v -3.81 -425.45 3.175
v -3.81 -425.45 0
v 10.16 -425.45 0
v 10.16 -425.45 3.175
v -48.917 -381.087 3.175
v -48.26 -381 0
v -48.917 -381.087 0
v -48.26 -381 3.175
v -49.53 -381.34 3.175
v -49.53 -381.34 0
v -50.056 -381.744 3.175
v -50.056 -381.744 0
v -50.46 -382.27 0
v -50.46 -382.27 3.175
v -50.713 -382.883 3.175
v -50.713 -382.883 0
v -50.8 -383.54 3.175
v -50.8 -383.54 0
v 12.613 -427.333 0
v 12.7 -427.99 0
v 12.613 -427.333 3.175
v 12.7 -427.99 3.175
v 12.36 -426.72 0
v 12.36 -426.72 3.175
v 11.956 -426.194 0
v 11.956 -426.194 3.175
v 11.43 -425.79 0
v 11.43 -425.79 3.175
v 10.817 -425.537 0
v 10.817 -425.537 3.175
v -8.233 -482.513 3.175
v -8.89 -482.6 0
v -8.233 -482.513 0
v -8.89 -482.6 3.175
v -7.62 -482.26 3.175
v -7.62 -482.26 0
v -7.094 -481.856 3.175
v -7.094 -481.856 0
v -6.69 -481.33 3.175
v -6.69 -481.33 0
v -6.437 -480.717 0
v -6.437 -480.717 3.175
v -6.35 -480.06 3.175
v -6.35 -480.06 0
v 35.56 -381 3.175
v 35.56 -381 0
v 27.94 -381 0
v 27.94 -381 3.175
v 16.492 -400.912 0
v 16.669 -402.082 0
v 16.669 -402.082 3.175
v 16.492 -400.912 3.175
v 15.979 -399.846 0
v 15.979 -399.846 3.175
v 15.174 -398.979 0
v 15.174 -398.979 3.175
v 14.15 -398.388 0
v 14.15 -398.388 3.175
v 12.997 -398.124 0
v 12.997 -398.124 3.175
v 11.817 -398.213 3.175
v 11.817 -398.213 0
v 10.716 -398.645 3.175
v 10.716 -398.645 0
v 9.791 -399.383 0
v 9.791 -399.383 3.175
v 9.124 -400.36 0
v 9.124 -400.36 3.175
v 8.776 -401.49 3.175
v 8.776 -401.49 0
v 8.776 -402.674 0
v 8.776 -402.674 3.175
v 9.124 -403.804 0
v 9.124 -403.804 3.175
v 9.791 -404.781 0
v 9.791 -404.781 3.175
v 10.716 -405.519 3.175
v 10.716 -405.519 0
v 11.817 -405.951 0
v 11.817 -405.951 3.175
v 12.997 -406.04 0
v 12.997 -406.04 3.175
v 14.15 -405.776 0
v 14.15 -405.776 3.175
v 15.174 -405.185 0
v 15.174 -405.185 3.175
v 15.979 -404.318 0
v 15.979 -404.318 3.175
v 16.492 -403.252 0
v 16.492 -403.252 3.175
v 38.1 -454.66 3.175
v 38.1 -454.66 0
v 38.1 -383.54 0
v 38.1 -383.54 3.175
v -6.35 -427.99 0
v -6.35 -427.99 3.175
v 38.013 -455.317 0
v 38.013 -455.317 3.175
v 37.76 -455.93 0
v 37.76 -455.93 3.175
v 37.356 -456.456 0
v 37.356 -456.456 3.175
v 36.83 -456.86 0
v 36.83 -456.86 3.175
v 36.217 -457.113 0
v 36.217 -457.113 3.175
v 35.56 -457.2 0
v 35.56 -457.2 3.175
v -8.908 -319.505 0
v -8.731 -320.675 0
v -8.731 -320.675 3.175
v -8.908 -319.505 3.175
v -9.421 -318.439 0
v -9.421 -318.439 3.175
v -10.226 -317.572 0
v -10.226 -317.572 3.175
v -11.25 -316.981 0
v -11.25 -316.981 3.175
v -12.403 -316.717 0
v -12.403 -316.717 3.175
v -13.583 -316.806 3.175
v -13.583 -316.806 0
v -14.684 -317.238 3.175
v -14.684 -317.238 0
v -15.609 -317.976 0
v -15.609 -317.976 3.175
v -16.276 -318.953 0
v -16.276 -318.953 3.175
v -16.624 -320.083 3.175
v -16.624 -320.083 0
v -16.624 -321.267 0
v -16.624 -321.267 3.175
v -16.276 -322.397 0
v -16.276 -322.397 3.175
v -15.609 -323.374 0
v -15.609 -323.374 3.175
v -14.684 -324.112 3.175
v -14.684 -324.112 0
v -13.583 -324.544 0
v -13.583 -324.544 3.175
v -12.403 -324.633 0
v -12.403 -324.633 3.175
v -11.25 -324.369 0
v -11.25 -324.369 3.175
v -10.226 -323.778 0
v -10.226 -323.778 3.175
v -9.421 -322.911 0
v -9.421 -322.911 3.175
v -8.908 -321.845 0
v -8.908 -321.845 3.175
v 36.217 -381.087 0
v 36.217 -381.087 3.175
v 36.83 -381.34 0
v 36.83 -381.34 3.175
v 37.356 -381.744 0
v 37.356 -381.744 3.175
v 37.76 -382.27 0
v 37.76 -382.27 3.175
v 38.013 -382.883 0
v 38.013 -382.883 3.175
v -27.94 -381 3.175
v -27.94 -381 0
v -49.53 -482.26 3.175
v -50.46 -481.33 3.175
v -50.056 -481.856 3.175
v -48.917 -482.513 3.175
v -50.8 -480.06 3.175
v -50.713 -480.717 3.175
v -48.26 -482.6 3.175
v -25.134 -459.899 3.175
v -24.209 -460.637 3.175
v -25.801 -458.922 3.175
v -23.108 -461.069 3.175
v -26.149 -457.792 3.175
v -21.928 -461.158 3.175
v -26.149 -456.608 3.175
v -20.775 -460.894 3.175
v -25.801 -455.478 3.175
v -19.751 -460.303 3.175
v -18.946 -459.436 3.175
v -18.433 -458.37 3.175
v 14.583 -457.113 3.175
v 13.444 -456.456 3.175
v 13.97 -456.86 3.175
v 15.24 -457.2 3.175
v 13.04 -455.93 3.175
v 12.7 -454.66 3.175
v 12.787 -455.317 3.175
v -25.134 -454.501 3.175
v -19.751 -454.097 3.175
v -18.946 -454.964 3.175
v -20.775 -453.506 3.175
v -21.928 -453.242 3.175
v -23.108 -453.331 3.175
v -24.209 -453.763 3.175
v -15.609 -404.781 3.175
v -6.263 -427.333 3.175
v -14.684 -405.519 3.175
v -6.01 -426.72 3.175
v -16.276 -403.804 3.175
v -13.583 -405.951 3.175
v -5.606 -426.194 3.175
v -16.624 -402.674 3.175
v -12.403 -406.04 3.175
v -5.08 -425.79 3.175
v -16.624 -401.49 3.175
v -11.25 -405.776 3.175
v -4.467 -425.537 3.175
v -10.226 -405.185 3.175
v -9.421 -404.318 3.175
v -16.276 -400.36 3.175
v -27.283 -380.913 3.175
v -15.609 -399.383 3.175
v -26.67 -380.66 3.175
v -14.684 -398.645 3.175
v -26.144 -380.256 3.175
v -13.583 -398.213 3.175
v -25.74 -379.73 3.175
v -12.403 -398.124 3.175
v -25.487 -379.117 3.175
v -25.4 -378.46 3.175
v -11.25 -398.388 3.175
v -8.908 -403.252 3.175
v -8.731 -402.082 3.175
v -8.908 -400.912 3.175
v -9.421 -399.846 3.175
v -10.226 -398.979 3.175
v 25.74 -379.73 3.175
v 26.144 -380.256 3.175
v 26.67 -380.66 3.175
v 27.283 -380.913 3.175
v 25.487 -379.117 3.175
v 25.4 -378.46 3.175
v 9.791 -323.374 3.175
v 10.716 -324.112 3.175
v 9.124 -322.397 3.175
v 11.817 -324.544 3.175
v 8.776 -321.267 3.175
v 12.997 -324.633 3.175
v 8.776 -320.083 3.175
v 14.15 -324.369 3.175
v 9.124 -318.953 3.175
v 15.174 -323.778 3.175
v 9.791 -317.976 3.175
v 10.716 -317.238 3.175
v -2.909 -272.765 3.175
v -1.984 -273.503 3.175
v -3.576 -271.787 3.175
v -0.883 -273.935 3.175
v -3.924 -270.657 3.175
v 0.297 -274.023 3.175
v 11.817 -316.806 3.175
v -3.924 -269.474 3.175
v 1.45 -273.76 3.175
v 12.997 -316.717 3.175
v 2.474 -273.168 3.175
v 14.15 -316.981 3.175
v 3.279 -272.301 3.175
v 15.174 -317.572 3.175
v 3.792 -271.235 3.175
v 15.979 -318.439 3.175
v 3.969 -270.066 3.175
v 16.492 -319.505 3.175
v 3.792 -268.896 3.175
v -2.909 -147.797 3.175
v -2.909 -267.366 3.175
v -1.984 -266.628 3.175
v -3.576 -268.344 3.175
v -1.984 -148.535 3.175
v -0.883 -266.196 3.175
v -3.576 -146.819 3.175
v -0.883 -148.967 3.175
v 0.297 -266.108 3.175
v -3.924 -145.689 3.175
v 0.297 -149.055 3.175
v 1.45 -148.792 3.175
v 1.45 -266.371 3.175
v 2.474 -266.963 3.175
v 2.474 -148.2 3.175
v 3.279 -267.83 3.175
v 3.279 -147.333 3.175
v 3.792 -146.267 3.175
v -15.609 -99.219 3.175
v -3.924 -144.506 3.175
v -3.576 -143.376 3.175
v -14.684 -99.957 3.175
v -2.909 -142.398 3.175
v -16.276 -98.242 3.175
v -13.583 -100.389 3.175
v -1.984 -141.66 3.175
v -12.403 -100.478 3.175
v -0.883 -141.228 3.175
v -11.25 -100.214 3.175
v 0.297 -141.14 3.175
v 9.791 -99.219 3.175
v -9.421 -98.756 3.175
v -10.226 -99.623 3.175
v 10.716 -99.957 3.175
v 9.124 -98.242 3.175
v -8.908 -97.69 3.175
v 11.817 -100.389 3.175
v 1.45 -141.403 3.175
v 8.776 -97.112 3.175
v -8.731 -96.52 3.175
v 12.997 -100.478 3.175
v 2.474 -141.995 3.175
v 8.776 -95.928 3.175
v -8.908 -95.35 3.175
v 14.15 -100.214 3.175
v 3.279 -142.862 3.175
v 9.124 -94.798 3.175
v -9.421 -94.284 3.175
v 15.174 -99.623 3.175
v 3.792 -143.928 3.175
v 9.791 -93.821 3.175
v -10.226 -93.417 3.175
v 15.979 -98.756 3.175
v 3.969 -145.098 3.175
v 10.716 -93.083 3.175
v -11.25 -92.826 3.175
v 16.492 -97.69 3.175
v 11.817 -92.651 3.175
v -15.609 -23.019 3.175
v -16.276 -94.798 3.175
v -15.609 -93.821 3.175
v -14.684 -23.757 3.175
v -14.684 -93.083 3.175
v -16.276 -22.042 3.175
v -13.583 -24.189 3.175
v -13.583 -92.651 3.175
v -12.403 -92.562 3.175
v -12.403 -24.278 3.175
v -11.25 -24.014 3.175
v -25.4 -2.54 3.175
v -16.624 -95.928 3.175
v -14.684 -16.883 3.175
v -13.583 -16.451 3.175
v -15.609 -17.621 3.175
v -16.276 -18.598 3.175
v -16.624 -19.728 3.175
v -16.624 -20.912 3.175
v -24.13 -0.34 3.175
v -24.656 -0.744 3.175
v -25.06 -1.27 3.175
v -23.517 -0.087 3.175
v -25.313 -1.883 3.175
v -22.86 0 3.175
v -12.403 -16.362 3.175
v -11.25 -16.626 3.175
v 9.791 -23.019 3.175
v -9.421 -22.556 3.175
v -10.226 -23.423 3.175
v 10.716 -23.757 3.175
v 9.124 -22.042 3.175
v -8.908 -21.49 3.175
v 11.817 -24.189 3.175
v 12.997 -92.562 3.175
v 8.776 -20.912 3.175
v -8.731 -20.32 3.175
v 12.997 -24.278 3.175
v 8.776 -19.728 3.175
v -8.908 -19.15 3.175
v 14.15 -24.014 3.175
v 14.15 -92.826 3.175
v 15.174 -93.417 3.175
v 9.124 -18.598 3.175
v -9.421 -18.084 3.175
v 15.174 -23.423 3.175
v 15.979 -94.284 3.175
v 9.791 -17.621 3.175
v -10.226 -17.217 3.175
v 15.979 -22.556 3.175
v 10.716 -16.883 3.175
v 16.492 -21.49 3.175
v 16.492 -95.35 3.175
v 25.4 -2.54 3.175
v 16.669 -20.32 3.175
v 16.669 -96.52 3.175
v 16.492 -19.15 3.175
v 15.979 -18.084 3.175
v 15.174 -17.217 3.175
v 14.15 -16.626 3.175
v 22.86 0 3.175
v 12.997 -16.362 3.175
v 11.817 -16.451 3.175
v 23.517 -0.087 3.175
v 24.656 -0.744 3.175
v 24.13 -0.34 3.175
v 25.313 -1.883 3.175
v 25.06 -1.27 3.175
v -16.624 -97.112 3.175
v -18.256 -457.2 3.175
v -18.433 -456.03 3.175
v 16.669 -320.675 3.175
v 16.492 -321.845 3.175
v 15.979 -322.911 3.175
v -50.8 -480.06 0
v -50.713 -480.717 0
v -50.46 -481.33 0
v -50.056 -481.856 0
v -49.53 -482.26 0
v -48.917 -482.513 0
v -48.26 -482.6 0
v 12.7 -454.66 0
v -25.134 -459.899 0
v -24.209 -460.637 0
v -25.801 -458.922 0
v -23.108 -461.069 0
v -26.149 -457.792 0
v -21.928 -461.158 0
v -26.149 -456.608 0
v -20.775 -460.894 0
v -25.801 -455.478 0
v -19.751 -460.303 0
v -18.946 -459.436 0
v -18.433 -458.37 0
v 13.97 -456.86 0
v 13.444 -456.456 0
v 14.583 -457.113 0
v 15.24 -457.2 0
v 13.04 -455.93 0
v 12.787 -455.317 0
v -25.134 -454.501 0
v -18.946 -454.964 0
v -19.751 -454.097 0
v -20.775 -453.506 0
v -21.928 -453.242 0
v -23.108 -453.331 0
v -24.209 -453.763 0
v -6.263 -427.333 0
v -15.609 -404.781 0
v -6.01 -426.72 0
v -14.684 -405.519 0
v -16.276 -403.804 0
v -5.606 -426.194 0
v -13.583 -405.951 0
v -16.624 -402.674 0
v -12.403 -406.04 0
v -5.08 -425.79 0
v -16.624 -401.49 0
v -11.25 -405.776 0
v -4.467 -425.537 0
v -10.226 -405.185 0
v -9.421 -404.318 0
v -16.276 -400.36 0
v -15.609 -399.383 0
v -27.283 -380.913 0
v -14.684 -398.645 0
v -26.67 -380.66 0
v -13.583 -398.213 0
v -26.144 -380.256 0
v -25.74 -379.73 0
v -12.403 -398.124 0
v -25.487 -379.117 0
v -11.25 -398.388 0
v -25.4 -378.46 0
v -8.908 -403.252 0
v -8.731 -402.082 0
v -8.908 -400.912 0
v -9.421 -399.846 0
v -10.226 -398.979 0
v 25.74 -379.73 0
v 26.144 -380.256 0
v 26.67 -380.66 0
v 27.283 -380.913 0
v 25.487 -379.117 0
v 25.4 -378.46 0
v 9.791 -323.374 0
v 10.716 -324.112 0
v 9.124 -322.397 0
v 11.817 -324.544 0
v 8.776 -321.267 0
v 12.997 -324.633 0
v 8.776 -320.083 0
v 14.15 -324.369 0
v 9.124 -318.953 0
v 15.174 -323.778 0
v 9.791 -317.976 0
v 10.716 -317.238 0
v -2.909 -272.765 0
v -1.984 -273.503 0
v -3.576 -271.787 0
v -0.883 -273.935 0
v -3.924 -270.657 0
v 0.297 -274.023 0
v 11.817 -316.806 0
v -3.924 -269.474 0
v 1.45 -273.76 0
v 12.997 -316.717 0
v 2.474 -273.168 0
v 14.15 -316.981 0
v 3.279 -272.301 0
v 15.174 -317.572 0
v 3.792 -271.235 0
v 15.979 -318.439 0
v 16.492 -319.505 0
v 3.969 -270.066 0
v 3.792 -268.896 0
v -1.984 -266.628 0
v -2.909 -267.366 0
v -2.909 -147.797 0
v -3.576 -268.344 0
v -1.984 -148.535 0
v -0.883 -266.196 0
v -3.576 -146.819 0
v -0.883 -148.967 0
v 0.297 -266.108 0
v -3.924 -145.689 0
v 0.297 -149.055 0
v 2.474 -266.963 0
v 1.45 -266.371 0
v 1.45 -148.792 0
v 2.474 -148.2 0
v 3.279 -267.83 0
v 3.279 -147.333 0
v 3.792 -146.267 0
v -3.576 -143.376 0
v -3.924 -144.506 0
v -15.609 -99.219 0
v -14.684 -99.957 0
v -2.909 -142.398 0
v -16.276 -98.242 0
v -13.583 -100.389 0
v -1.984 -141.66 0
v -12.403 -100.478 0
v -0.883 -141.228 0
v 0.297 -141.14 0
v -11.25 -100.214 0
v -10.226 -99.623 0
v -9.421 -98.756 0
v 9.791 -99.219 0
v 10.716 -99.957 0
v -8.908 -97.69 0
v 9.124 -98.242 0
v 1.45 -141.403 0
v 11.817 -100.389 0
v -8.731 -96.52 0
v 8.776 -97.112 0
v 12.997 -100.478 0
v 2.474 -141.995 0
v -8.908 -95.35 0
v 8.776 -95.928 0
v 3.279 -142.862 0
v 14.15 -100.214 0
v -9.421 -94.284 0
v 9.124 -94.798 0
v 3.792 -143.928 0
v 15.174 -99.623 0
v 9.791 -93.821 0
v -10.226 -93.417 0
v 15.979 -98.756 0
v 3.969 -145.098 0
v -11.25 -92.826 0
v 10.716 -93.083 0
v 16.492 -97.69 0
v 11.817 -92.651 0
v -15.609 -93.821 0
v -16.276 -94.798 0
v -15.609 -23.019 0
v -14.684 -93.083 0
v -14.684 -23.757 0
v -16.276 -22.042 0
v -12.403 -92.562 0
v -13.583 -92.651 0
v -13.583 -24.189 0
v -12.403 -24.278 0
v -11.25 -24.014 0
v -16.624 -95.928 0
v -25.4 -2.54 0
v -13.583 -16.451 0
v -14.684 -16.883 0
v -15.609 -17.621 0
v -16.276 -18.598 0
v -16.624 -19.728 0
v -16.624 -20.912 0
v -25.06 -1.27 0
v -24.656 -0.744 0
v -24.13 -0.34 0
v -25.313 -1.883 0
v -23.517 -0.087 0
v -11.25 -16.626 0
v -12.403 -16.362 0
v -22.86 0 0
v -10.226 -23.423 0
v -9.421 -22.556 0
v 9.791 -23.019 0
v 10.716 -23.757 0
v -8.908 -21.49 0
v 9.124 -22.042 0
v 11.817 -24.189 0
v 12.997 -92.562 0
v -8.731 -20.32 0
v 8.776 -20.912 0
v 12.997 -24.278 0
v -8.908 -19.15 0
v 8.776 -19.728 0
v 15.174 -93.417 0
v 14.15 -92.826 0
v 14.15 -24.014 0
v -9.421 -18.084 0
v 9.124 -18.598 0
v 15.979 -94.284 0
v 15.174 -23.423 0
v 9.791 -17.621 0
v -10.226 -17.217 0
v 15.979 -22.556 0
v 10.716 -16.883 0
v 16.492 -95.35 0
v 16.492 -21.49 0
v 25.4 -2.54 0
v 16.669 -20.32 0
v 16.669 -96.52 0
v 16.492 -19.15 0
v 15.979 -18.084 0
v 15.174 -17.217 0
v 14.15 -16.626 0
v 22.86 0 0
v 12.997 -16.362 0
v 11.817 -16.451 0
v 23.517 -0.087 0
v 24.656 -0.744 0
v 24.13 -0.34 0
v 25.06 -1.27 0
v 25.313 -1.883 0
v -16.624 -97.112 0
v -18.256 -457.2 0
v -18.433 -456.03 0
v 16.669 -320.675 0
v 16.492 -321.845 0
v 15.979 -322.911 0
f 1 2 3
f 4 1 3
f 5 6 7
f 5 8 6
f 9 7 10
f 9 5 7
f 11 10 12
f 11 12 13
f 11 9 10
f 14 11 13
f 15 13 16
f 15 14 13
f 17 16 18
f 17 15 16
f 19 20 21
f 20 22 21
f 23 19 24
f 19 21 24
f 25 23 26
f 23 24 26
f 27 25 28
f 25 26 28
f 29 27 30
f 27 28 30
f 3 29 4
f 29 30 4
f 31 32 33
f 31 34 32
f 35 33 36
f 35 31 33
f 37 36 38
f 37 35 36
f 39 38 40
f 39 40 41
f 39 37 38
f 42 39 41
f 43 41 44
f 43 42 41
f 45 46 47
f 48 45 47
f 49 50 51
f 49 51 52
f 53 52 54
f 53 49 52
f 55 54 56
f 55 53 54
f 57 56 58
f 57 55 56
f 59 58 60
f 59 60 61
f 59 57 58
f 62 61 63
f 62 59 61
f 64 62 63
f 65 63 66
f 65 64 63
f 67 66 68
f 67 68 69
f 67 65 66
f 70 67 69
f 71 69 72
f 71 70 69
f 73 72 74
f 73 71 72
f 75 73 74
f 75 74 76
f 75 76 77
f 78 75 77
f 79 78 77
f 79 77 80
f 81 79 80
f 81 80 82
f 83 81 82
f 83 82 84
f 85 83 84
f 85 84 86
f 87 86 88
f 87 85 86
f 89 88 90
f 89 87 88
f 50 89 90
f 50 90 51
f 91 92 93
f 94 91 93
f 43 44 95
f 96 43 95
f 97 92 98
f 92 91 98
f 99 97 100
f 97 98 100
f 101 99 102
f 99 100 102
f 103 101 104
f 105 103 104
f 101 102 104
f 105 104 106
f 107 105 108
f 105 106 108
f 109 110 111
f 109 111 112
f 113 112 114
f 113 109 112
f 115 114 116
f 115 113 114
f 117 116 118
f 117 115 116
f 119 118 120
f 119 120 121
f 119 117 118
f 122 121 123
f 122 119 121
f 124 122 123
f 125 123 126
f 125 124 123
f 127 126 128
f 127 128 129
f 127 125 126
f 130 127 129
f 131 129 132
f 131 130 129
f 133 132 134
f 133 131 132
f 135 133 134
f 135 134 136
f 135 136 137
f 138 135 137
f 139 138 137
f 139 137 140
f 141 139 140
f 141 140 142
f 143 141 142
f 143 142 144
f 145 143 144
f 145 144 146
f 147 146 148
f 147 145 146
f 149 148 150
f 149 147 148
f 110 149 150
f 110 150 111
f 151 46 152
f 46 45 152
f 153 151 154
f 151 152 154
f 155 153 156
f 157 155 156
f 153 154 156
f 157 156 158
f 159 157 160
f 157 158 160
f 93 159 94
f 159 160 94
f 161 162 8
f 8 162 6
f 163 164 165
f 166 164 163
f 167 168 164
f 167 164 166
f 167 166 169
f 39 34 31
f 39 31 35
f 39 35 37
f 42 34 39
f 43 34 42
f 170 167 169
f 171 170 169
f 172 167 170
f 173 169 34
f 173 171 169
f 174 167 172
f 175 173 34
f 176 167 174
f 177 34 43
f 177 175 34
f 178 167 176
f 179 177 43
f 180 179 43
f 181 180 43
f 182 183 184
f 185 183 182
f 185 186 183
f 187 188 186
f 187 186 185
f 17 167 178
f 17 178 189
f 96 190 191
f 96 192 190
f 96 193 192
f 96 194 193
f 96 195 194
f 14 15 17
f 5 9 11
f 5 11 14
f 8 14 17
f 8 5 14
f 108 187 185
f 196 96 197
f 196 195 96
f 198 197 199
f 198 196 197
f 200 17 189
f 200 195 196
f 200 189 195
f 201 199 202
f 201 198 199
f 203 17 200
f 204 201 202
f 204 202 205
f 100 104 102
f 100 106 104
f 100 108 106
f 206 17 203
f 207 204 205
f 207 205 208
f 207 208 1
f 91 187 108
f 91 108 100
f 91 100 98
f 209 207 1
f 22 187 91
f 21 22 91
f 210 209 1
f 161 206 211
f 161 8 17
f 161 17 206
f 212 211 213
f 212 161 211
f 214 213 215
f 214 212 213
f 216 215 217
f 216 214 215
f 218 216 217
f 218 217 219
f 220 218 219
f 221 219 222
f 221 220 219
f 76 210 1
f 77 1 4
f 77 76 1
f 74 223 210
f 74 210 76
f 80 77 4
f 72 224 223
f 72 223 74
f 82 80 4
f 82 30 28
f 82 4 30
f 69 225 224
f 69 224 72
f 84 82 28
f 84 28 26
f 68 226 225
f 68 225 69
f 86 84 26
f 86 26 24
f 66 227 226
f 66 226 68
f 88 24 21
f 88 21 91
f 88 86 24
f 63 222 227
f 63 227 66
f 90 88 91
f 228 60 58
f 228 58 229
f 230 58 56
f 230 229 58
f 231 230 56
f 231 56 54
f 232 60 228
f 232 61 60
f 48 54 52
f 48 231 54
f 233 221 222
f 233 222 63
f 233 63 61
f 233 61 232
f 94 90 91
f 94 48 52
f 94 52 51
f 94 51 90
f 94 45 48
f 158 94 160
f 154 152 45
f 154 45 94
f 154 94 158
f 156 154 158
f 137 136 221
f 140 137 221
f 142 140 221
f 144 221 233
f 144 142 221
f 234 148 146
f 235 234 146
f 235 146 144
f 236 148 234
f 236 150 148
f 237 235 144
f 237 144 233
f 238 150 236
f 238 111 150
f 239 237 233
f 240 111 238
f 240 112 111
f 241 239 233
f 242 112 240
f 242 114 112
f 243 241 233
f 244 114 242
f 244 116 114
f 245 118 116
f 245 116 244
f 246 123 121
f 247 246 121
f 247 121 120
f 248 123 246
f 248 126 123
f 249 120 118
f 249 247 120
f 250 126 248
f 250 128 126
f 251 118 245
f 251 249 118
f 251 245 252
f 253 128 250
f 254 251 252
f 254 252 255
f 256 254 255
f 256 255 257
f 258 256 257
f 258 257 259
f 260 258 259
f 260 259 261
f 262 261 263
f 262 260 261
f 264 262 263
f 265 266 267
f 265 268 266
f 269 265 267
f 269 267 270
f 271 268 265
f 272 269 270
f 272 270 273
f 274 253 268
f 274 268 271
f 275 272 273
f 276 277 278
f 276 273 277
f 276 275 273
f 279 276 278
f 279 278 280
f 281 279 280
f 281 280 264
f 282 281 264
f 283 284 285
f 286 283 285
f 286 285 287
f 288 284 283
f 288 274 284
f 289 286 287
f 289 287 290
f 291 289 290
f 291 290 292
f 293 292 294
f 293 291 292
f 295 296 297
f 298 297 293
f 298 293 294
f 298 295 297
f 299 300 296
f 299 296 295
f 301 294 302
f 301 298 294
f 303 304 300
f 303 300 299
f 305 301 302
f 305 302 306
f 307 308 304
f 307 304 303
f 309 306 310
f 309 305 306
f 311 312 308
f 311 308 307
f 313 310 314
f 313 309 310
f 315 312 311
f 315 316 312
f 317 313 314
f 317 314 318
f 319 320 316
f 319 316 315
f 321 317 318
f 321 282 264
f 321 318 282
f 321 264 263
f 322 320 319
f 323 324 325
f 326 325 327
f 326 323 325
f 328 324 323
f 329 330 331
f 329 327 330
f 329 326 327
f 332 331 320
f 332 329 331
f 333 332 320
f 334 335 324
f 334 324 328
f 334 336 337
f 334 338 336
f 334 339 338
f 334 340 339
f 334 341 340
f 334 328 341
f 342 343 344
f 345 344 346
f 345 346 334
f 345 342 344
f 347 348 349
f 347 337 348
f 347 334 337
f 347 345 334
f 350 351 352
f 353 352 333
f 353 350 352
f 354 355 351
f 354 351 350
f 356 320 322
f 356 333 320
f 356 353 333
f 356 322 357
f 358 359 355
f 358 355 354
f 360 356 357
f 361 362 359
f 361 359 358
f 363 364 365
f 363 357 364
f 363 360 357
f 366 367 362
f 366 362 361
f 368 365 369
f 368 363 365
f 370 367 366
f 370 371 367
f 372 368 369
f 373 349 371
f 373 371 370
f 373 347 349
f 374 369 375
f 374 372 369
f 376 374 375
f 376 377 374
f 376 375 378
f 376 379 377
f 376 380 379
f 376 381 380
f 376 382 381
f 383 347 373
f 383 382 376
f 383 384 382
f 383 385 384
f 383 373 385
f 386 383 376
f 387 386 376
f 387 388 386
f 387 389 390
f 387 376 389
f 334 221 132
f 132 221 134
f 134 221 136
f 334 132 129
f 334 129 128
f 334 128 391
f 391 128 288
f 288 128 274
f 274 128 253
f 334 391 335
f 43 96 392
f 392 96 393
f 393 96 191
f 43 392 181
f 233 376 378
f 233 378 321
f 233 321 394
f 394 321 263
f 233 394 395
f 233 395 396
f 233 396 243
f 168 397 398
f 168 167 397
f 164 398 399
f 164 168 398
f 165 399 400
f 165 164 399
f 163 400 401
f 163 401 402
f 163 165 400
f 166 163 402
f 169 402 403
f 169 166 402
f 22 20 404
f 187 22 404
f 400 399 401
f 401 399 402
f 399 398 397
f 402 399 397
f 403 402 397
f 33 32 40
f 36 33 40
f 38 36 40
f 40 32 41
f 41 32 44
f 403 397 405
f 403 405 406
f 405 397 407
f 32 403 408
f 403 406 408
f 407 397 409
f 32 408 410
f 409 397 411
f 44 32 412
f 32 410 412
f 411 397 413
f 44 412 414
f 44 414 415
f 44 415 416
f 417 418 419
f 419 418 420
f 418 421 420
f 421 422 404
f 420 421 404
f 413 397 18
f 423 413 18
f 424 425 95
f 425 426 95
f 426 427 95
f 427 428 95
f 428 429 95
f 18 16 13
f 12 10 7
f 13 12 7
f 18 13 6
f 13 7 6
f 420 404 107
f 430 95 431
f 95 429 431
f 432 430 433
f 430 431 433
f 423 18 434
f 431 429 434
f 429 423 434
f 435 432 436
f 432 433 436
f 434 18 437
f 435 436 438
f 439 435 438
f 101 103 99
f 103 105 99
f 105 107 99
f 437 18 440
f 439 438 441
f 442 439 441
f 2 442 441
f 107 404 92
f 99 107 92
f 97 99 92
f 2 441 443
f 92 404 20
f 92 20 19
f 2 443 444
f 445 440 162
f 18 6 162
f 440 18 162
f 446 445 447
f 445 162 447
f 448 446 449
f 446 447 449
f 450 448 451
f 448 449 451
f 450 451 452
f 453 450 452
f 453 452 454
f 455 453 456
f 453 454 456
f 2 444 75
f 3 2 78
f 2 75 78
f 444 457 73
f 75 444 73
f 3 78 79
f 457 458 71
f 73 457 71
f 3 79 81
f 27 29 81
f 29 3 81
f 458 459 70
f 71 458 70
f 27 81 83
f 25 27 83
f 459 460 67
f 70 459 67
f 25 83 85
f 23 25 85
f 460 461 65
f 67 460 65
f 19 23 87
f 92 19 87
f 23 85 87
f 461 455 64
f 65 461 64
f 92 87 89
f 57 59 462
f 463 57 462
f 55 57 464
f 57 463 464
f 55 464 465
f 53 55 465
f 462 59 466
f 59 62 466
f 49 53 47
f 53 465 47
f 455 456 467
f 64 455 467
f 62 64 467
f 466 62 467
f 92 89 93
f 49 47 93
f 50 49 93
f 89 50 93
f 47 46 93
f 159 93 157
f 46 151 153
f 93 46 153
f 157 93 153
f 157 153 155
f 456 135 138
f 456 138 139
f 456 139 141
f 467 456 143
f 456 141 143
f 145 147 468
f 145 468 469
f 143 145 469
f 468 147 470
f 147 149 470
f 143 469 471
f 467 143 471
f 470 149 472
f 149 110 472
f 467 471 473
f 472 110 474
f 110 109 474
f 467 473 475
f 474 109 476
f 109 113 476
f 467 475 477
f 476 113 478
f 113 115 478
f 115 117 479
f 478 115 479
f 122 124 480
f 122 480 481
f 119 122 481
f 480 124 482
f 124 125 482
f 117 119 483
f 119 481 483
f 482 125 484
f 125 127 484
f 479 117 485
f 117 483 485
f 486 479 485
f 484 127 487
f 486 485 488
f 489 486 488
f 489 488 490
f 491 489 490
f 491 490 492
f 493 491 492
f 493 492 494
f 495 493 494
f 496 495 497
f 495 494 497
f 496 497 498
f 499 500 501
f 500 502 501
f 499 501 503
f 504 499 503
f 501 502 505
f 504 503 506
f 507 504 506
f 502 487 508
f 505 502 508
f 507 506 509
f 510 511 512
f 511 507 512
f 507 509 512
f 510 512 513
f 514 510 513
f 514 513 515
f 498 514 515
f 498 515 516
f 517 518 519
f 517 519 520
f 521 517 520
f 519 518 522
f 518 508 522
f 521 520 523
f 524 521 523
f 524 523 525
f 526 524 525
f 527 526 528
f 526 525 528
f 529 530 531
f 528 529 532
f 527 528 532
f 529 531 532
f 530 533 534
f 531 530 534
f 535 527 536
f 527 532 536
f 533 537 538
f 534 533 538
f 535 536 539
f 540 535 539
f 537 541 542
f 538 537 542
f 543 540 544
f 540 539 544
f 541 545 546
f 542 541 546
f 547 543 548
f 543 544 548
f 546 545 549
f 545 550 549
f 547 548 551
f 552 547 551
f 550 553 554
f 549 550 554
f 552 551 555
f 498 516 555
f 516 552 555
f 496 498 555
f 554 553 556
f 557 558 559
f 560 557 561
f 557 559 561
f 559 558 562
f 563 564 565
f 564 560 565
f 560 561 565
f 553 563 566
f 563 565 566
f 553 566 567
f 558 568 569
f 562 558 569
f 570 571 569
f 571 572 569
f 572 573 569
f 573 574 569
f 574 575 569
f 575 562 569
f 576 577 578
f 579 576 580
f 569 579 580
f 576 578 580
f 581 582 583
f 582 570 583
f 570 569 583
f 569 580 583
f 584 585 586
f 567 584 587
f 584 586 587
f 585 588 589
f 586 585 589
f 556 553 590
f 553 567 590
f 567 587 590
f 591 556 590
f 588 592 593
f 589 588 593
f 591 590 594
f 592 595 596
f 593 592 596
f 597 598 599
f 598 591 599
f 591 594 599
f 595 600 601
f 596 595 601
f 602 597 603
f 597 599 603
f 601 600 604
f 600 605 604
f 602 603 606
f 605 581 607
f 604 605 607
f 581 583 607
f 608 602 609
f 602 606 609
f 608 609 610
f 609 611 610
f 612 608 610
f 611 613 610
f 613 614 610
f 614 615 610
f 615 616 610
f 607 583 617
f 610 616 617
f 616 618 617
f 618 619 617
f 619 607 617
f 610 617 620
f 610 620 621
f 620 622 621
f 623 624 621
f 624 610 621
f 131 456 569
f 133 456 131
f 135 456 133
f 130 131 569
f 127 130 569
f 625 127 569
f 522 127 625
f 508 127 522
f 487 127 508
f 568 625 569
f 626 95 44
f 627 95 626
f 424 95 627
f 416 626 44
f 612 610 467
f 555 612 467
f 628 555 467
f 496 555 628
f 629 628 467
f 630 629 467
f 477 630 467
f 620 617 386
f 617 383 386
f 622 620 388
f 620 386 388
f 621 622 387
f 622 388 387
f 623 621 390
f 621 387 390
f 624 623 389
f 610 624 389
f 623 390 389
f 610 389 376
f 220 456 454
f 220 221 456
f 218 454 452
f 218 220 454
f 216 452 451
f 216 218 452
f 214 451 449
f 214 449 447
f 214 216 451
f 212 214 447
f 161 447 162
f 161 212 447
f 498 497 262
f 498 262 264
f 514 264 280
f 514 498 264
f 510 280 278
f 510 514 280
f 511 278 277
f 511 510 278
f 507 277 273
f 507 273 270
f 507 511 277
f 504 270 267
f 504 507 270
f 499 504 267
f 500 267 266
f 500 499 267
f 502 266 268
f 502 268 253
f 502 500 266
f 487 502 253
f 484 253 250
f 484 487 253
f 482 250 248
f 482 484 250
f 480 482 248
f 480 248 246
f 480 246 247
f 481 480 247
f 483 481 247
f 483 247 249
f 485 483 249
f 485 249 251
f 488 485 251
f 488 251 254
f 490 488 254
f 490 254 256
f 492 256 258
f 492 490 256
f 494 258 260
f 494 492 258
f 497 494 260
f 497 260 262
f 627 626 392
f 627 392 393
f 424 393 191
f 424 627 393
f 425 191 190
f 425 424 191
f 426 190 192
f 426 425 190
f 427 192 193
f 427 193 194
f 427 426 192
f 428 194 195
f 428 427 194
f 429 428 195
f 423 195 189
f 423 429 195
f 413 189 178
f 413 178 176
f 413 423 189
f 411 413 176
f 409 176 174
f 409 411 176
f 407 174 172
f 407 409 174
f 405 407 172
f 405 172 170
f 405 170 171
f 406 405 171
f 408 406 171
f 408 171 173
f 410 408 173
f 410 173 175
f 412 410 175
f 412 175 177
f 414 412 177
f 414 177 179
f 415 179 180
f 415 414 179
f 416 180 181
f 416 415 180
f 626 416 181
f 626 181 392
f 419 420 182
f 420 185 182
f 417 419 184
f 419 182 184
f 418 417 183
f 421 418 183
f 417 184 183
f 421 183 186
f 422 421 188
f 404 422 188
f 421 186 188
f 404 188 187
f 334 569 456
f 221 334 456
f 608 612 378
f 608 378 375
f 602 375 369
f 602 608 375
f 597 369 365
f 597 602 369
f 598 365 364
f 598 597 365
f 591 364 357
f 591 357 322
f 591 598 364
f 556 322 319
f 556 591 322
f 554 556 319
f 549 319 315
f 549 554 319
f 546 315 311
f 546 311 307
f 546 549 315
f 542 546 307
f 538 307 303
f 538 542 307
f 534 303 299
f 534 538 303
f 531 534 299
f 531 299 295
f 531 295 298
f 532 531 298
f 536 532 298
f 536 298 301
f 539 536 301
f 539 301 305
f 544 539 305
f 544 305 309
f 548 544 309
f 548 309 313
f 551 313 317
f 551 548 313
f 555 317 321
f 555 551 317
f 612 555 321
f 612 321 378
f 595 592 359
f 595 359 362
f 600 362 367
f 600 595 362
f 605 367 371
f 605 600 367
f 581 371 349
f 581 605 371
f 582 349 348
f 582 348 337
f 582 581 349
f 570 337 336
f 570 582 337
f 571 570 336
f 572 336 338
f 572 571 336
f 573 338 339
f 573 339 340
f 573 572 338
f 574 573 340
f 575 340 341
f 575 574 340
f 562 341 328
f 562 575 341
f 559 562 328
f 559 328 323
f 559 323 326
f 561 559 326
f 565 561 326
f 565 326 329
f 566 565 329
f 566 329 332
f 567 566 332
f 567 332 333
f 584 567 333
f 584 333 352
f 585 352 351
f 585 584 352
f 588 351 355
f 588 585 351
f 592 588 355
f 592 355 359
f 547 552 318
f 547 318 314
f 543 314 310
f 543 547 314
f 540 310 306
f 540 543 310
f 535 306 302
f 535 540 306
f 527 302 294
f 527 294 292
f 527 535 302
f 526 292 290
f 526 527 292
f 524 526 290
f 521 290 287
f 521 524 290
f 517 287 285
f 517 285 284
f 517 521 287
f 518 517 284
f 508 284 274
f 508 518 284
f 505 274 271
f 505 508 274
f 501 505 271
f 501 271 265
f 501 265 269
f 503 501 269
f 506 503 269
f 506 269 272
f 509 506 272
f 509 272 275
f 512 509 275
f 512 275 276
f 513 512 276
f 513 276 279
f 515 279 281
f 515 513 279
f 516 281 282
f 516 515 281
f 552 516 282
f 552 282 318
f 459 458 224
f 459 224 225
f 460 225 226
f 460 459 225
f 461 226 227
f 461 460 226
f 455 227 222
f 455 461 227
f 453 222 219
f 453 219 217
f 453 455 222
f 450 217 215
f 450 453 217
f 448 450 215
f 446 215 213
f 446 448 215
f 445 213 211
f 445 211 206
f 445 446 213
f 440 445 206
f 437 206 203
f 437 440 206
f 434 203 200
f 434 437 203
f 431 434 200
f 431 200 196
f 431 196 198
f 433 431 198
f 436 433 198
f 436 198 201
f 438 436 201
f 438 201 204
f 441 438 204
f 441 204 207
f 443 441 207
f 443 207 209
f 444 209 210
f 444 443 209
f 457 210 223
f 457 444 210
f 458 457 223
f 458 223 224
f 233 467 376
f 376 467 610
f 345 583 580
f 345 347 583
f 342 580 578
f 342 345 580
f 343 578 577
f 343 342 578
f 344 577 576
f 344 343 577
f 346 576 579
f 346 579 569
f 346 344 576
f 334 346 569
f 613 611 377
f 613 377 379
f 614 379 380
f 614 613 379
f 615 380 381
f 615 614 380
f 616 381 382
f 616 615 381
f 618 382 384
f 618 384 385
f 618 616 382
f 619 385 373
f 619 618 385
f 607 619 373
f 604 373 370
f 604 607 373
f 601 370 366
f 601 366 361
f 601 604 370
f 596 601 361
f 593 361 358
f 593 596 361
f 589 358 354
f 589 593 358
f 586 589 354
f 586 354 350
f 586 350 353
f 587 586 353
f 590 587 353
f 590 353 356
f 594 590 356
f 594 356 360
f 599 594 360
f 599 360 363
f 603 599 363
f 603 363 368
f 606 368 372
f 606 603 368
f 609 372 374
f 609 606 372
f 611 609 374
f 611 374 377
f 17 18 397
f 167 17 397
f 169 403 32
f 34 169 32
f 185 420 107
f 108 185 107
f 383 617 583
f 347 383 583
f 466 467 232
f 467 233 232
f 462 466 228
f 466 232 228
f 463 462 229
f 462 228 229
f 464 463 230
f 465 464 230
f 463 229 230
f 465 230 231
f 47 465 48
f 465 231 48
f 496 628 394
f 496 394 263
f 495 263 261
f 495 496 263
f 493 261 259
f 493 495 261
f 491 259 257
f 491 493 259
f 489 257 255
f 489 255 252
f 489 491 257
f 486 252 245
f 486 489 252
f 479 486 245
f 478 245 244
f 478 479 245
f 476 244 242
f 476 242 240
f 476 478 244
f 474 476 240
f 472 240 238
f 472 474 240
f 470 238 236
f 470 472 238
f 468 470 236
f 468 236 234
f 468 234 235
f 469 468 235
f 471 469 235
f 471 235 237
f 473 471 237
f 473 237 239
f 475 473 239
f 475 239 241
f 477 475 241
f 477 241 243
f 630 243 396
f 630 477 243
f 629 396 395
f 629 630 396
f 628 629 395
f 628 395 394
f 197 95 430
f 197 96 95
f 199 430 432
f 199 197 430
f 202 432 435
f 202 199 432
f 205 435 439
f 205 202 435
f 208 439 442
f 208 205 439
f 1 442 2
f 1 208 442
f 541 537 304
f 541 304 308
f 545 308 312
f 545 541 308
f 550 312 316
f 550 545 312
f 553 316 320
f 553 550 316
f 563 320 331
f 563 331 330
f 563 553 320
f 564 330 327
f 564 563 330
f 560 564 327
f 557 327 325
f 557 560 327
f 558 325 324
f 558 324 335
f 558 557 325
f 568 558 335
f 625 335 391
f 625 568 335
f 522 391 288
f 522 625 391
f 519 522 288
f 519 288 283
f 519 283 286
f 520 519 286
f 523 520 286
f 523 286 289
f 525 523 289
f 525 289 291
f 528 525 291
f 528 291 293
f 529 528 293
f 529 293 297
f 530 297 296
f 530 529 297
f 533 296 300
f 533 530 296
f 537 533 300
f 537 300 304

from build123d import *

# Parameters (mm, degrees)
BOSS_EXTRUDE1_OUTLINE_R = 3.96875
BOSS_EXTRUDE1_DEPTH     = 3.175
FILLET2_R               = 2.54


# Read off the part's stored shape, not the designer's step: Boss-Extrude1
with BuildPart() as part:
    # Boss-Extrude1 outline → Boss-Extrude1 (new body)
    with BuildSketch(Plane.XY):
        Polygon((25.4, 0), (-25.4, 0), (-25.4, -381), (-50.8, -381), (-50.8, -482.6), (-6.35, -482.6), (-6.35, -425.45), (12.7, -425.45), (12.7, -457.2), (38.1, -457.2), (38.1, -381), (25.4, -381), align=None)
        with Locations((-22.225, -457.2)):
            Circle(BOSS_EXTRUDE1_OUTLINE_R, mode=Mode.SUBTRACT)
        with Locations((-12.7, -402.082)):
            Circle(BOSS_EXTRUDE1_OUTLINE_R, mode=Mode.SUBTRACT)
        with Locations((-12.7, -320.675)):
            Circle(BOSS_EXTRUDE1_OUTLINE_R, mode=Mode.SUBTRACT)
        with Locations((12.7, -402.082)):
            Circle(BOSS_EXTRUDE1_OUTLINE_R, mode=Mode.SUBTRACT)
        with Locations((12.7, -320.675)):
            Circle(BOSS_EXTRUDE1_OUTLINE_R, mode=Mode.SUBTRACT)
        with Locations((0, -270.0655)):
            Circle(BOSS_EXTRUDE1_OUTLINE_R, mode=Mode.SUBTRACT)
        with Locations((-12.7, -96.52)):
            Circle(BOSS_EXTRUDE1_OUTLINE_R, mode=Mode.SUBTRACT)
        with Locations((-12.7, -20.32)):
            Circle(BOSS_EXTRUDE1_OUTLINE_R, mode=Mode.SUBTRACT)
        with Locations((0, -145.0975)):
            Circle(BOSS_EXTRUDE1_OUTLINE_R, mode=Mode.SUBTRACT)
        with Locations((12.7, -96.52)):
            Circle(BOSS_EXTRUDE1_OUTLINE_R, mode=Mode.SUBTRACT)
        with Locations((12.7, -20.32)):
            Circle(BOSS_EXTRUDE1_OUTLINE_R, mode=Mode.SUBTRACT)
    extrude(amount=BOSS_EXTRUDE1_DEPTH)

    # Fillet2
    fillet2_edges = [part.edges().sort_by_distance(p)[0] for p in [
        (25.4, 0, 1.5875),
        (25.4, -381, 1.5875),
        (38.1, -381, 1.5875),
        (38.1, -457.2, 1.5875),
        (12.7, -457.2, 1.5875),
        (12.7, -425.45, 1.5875),
        (-6.35, -425.45, 1.5875),
        (-6.35, -482.6, 1.5875),
        (-50.8, -482.6, 1.5875),
        (-50.8, -381, 1.5875),
        (-25.4, -381, 1.5875),
        (-25.4, 0, 1.5875),
    ]]
    fillet(fillet2_edges, radius=FILLET2_R)


solid = part.part
